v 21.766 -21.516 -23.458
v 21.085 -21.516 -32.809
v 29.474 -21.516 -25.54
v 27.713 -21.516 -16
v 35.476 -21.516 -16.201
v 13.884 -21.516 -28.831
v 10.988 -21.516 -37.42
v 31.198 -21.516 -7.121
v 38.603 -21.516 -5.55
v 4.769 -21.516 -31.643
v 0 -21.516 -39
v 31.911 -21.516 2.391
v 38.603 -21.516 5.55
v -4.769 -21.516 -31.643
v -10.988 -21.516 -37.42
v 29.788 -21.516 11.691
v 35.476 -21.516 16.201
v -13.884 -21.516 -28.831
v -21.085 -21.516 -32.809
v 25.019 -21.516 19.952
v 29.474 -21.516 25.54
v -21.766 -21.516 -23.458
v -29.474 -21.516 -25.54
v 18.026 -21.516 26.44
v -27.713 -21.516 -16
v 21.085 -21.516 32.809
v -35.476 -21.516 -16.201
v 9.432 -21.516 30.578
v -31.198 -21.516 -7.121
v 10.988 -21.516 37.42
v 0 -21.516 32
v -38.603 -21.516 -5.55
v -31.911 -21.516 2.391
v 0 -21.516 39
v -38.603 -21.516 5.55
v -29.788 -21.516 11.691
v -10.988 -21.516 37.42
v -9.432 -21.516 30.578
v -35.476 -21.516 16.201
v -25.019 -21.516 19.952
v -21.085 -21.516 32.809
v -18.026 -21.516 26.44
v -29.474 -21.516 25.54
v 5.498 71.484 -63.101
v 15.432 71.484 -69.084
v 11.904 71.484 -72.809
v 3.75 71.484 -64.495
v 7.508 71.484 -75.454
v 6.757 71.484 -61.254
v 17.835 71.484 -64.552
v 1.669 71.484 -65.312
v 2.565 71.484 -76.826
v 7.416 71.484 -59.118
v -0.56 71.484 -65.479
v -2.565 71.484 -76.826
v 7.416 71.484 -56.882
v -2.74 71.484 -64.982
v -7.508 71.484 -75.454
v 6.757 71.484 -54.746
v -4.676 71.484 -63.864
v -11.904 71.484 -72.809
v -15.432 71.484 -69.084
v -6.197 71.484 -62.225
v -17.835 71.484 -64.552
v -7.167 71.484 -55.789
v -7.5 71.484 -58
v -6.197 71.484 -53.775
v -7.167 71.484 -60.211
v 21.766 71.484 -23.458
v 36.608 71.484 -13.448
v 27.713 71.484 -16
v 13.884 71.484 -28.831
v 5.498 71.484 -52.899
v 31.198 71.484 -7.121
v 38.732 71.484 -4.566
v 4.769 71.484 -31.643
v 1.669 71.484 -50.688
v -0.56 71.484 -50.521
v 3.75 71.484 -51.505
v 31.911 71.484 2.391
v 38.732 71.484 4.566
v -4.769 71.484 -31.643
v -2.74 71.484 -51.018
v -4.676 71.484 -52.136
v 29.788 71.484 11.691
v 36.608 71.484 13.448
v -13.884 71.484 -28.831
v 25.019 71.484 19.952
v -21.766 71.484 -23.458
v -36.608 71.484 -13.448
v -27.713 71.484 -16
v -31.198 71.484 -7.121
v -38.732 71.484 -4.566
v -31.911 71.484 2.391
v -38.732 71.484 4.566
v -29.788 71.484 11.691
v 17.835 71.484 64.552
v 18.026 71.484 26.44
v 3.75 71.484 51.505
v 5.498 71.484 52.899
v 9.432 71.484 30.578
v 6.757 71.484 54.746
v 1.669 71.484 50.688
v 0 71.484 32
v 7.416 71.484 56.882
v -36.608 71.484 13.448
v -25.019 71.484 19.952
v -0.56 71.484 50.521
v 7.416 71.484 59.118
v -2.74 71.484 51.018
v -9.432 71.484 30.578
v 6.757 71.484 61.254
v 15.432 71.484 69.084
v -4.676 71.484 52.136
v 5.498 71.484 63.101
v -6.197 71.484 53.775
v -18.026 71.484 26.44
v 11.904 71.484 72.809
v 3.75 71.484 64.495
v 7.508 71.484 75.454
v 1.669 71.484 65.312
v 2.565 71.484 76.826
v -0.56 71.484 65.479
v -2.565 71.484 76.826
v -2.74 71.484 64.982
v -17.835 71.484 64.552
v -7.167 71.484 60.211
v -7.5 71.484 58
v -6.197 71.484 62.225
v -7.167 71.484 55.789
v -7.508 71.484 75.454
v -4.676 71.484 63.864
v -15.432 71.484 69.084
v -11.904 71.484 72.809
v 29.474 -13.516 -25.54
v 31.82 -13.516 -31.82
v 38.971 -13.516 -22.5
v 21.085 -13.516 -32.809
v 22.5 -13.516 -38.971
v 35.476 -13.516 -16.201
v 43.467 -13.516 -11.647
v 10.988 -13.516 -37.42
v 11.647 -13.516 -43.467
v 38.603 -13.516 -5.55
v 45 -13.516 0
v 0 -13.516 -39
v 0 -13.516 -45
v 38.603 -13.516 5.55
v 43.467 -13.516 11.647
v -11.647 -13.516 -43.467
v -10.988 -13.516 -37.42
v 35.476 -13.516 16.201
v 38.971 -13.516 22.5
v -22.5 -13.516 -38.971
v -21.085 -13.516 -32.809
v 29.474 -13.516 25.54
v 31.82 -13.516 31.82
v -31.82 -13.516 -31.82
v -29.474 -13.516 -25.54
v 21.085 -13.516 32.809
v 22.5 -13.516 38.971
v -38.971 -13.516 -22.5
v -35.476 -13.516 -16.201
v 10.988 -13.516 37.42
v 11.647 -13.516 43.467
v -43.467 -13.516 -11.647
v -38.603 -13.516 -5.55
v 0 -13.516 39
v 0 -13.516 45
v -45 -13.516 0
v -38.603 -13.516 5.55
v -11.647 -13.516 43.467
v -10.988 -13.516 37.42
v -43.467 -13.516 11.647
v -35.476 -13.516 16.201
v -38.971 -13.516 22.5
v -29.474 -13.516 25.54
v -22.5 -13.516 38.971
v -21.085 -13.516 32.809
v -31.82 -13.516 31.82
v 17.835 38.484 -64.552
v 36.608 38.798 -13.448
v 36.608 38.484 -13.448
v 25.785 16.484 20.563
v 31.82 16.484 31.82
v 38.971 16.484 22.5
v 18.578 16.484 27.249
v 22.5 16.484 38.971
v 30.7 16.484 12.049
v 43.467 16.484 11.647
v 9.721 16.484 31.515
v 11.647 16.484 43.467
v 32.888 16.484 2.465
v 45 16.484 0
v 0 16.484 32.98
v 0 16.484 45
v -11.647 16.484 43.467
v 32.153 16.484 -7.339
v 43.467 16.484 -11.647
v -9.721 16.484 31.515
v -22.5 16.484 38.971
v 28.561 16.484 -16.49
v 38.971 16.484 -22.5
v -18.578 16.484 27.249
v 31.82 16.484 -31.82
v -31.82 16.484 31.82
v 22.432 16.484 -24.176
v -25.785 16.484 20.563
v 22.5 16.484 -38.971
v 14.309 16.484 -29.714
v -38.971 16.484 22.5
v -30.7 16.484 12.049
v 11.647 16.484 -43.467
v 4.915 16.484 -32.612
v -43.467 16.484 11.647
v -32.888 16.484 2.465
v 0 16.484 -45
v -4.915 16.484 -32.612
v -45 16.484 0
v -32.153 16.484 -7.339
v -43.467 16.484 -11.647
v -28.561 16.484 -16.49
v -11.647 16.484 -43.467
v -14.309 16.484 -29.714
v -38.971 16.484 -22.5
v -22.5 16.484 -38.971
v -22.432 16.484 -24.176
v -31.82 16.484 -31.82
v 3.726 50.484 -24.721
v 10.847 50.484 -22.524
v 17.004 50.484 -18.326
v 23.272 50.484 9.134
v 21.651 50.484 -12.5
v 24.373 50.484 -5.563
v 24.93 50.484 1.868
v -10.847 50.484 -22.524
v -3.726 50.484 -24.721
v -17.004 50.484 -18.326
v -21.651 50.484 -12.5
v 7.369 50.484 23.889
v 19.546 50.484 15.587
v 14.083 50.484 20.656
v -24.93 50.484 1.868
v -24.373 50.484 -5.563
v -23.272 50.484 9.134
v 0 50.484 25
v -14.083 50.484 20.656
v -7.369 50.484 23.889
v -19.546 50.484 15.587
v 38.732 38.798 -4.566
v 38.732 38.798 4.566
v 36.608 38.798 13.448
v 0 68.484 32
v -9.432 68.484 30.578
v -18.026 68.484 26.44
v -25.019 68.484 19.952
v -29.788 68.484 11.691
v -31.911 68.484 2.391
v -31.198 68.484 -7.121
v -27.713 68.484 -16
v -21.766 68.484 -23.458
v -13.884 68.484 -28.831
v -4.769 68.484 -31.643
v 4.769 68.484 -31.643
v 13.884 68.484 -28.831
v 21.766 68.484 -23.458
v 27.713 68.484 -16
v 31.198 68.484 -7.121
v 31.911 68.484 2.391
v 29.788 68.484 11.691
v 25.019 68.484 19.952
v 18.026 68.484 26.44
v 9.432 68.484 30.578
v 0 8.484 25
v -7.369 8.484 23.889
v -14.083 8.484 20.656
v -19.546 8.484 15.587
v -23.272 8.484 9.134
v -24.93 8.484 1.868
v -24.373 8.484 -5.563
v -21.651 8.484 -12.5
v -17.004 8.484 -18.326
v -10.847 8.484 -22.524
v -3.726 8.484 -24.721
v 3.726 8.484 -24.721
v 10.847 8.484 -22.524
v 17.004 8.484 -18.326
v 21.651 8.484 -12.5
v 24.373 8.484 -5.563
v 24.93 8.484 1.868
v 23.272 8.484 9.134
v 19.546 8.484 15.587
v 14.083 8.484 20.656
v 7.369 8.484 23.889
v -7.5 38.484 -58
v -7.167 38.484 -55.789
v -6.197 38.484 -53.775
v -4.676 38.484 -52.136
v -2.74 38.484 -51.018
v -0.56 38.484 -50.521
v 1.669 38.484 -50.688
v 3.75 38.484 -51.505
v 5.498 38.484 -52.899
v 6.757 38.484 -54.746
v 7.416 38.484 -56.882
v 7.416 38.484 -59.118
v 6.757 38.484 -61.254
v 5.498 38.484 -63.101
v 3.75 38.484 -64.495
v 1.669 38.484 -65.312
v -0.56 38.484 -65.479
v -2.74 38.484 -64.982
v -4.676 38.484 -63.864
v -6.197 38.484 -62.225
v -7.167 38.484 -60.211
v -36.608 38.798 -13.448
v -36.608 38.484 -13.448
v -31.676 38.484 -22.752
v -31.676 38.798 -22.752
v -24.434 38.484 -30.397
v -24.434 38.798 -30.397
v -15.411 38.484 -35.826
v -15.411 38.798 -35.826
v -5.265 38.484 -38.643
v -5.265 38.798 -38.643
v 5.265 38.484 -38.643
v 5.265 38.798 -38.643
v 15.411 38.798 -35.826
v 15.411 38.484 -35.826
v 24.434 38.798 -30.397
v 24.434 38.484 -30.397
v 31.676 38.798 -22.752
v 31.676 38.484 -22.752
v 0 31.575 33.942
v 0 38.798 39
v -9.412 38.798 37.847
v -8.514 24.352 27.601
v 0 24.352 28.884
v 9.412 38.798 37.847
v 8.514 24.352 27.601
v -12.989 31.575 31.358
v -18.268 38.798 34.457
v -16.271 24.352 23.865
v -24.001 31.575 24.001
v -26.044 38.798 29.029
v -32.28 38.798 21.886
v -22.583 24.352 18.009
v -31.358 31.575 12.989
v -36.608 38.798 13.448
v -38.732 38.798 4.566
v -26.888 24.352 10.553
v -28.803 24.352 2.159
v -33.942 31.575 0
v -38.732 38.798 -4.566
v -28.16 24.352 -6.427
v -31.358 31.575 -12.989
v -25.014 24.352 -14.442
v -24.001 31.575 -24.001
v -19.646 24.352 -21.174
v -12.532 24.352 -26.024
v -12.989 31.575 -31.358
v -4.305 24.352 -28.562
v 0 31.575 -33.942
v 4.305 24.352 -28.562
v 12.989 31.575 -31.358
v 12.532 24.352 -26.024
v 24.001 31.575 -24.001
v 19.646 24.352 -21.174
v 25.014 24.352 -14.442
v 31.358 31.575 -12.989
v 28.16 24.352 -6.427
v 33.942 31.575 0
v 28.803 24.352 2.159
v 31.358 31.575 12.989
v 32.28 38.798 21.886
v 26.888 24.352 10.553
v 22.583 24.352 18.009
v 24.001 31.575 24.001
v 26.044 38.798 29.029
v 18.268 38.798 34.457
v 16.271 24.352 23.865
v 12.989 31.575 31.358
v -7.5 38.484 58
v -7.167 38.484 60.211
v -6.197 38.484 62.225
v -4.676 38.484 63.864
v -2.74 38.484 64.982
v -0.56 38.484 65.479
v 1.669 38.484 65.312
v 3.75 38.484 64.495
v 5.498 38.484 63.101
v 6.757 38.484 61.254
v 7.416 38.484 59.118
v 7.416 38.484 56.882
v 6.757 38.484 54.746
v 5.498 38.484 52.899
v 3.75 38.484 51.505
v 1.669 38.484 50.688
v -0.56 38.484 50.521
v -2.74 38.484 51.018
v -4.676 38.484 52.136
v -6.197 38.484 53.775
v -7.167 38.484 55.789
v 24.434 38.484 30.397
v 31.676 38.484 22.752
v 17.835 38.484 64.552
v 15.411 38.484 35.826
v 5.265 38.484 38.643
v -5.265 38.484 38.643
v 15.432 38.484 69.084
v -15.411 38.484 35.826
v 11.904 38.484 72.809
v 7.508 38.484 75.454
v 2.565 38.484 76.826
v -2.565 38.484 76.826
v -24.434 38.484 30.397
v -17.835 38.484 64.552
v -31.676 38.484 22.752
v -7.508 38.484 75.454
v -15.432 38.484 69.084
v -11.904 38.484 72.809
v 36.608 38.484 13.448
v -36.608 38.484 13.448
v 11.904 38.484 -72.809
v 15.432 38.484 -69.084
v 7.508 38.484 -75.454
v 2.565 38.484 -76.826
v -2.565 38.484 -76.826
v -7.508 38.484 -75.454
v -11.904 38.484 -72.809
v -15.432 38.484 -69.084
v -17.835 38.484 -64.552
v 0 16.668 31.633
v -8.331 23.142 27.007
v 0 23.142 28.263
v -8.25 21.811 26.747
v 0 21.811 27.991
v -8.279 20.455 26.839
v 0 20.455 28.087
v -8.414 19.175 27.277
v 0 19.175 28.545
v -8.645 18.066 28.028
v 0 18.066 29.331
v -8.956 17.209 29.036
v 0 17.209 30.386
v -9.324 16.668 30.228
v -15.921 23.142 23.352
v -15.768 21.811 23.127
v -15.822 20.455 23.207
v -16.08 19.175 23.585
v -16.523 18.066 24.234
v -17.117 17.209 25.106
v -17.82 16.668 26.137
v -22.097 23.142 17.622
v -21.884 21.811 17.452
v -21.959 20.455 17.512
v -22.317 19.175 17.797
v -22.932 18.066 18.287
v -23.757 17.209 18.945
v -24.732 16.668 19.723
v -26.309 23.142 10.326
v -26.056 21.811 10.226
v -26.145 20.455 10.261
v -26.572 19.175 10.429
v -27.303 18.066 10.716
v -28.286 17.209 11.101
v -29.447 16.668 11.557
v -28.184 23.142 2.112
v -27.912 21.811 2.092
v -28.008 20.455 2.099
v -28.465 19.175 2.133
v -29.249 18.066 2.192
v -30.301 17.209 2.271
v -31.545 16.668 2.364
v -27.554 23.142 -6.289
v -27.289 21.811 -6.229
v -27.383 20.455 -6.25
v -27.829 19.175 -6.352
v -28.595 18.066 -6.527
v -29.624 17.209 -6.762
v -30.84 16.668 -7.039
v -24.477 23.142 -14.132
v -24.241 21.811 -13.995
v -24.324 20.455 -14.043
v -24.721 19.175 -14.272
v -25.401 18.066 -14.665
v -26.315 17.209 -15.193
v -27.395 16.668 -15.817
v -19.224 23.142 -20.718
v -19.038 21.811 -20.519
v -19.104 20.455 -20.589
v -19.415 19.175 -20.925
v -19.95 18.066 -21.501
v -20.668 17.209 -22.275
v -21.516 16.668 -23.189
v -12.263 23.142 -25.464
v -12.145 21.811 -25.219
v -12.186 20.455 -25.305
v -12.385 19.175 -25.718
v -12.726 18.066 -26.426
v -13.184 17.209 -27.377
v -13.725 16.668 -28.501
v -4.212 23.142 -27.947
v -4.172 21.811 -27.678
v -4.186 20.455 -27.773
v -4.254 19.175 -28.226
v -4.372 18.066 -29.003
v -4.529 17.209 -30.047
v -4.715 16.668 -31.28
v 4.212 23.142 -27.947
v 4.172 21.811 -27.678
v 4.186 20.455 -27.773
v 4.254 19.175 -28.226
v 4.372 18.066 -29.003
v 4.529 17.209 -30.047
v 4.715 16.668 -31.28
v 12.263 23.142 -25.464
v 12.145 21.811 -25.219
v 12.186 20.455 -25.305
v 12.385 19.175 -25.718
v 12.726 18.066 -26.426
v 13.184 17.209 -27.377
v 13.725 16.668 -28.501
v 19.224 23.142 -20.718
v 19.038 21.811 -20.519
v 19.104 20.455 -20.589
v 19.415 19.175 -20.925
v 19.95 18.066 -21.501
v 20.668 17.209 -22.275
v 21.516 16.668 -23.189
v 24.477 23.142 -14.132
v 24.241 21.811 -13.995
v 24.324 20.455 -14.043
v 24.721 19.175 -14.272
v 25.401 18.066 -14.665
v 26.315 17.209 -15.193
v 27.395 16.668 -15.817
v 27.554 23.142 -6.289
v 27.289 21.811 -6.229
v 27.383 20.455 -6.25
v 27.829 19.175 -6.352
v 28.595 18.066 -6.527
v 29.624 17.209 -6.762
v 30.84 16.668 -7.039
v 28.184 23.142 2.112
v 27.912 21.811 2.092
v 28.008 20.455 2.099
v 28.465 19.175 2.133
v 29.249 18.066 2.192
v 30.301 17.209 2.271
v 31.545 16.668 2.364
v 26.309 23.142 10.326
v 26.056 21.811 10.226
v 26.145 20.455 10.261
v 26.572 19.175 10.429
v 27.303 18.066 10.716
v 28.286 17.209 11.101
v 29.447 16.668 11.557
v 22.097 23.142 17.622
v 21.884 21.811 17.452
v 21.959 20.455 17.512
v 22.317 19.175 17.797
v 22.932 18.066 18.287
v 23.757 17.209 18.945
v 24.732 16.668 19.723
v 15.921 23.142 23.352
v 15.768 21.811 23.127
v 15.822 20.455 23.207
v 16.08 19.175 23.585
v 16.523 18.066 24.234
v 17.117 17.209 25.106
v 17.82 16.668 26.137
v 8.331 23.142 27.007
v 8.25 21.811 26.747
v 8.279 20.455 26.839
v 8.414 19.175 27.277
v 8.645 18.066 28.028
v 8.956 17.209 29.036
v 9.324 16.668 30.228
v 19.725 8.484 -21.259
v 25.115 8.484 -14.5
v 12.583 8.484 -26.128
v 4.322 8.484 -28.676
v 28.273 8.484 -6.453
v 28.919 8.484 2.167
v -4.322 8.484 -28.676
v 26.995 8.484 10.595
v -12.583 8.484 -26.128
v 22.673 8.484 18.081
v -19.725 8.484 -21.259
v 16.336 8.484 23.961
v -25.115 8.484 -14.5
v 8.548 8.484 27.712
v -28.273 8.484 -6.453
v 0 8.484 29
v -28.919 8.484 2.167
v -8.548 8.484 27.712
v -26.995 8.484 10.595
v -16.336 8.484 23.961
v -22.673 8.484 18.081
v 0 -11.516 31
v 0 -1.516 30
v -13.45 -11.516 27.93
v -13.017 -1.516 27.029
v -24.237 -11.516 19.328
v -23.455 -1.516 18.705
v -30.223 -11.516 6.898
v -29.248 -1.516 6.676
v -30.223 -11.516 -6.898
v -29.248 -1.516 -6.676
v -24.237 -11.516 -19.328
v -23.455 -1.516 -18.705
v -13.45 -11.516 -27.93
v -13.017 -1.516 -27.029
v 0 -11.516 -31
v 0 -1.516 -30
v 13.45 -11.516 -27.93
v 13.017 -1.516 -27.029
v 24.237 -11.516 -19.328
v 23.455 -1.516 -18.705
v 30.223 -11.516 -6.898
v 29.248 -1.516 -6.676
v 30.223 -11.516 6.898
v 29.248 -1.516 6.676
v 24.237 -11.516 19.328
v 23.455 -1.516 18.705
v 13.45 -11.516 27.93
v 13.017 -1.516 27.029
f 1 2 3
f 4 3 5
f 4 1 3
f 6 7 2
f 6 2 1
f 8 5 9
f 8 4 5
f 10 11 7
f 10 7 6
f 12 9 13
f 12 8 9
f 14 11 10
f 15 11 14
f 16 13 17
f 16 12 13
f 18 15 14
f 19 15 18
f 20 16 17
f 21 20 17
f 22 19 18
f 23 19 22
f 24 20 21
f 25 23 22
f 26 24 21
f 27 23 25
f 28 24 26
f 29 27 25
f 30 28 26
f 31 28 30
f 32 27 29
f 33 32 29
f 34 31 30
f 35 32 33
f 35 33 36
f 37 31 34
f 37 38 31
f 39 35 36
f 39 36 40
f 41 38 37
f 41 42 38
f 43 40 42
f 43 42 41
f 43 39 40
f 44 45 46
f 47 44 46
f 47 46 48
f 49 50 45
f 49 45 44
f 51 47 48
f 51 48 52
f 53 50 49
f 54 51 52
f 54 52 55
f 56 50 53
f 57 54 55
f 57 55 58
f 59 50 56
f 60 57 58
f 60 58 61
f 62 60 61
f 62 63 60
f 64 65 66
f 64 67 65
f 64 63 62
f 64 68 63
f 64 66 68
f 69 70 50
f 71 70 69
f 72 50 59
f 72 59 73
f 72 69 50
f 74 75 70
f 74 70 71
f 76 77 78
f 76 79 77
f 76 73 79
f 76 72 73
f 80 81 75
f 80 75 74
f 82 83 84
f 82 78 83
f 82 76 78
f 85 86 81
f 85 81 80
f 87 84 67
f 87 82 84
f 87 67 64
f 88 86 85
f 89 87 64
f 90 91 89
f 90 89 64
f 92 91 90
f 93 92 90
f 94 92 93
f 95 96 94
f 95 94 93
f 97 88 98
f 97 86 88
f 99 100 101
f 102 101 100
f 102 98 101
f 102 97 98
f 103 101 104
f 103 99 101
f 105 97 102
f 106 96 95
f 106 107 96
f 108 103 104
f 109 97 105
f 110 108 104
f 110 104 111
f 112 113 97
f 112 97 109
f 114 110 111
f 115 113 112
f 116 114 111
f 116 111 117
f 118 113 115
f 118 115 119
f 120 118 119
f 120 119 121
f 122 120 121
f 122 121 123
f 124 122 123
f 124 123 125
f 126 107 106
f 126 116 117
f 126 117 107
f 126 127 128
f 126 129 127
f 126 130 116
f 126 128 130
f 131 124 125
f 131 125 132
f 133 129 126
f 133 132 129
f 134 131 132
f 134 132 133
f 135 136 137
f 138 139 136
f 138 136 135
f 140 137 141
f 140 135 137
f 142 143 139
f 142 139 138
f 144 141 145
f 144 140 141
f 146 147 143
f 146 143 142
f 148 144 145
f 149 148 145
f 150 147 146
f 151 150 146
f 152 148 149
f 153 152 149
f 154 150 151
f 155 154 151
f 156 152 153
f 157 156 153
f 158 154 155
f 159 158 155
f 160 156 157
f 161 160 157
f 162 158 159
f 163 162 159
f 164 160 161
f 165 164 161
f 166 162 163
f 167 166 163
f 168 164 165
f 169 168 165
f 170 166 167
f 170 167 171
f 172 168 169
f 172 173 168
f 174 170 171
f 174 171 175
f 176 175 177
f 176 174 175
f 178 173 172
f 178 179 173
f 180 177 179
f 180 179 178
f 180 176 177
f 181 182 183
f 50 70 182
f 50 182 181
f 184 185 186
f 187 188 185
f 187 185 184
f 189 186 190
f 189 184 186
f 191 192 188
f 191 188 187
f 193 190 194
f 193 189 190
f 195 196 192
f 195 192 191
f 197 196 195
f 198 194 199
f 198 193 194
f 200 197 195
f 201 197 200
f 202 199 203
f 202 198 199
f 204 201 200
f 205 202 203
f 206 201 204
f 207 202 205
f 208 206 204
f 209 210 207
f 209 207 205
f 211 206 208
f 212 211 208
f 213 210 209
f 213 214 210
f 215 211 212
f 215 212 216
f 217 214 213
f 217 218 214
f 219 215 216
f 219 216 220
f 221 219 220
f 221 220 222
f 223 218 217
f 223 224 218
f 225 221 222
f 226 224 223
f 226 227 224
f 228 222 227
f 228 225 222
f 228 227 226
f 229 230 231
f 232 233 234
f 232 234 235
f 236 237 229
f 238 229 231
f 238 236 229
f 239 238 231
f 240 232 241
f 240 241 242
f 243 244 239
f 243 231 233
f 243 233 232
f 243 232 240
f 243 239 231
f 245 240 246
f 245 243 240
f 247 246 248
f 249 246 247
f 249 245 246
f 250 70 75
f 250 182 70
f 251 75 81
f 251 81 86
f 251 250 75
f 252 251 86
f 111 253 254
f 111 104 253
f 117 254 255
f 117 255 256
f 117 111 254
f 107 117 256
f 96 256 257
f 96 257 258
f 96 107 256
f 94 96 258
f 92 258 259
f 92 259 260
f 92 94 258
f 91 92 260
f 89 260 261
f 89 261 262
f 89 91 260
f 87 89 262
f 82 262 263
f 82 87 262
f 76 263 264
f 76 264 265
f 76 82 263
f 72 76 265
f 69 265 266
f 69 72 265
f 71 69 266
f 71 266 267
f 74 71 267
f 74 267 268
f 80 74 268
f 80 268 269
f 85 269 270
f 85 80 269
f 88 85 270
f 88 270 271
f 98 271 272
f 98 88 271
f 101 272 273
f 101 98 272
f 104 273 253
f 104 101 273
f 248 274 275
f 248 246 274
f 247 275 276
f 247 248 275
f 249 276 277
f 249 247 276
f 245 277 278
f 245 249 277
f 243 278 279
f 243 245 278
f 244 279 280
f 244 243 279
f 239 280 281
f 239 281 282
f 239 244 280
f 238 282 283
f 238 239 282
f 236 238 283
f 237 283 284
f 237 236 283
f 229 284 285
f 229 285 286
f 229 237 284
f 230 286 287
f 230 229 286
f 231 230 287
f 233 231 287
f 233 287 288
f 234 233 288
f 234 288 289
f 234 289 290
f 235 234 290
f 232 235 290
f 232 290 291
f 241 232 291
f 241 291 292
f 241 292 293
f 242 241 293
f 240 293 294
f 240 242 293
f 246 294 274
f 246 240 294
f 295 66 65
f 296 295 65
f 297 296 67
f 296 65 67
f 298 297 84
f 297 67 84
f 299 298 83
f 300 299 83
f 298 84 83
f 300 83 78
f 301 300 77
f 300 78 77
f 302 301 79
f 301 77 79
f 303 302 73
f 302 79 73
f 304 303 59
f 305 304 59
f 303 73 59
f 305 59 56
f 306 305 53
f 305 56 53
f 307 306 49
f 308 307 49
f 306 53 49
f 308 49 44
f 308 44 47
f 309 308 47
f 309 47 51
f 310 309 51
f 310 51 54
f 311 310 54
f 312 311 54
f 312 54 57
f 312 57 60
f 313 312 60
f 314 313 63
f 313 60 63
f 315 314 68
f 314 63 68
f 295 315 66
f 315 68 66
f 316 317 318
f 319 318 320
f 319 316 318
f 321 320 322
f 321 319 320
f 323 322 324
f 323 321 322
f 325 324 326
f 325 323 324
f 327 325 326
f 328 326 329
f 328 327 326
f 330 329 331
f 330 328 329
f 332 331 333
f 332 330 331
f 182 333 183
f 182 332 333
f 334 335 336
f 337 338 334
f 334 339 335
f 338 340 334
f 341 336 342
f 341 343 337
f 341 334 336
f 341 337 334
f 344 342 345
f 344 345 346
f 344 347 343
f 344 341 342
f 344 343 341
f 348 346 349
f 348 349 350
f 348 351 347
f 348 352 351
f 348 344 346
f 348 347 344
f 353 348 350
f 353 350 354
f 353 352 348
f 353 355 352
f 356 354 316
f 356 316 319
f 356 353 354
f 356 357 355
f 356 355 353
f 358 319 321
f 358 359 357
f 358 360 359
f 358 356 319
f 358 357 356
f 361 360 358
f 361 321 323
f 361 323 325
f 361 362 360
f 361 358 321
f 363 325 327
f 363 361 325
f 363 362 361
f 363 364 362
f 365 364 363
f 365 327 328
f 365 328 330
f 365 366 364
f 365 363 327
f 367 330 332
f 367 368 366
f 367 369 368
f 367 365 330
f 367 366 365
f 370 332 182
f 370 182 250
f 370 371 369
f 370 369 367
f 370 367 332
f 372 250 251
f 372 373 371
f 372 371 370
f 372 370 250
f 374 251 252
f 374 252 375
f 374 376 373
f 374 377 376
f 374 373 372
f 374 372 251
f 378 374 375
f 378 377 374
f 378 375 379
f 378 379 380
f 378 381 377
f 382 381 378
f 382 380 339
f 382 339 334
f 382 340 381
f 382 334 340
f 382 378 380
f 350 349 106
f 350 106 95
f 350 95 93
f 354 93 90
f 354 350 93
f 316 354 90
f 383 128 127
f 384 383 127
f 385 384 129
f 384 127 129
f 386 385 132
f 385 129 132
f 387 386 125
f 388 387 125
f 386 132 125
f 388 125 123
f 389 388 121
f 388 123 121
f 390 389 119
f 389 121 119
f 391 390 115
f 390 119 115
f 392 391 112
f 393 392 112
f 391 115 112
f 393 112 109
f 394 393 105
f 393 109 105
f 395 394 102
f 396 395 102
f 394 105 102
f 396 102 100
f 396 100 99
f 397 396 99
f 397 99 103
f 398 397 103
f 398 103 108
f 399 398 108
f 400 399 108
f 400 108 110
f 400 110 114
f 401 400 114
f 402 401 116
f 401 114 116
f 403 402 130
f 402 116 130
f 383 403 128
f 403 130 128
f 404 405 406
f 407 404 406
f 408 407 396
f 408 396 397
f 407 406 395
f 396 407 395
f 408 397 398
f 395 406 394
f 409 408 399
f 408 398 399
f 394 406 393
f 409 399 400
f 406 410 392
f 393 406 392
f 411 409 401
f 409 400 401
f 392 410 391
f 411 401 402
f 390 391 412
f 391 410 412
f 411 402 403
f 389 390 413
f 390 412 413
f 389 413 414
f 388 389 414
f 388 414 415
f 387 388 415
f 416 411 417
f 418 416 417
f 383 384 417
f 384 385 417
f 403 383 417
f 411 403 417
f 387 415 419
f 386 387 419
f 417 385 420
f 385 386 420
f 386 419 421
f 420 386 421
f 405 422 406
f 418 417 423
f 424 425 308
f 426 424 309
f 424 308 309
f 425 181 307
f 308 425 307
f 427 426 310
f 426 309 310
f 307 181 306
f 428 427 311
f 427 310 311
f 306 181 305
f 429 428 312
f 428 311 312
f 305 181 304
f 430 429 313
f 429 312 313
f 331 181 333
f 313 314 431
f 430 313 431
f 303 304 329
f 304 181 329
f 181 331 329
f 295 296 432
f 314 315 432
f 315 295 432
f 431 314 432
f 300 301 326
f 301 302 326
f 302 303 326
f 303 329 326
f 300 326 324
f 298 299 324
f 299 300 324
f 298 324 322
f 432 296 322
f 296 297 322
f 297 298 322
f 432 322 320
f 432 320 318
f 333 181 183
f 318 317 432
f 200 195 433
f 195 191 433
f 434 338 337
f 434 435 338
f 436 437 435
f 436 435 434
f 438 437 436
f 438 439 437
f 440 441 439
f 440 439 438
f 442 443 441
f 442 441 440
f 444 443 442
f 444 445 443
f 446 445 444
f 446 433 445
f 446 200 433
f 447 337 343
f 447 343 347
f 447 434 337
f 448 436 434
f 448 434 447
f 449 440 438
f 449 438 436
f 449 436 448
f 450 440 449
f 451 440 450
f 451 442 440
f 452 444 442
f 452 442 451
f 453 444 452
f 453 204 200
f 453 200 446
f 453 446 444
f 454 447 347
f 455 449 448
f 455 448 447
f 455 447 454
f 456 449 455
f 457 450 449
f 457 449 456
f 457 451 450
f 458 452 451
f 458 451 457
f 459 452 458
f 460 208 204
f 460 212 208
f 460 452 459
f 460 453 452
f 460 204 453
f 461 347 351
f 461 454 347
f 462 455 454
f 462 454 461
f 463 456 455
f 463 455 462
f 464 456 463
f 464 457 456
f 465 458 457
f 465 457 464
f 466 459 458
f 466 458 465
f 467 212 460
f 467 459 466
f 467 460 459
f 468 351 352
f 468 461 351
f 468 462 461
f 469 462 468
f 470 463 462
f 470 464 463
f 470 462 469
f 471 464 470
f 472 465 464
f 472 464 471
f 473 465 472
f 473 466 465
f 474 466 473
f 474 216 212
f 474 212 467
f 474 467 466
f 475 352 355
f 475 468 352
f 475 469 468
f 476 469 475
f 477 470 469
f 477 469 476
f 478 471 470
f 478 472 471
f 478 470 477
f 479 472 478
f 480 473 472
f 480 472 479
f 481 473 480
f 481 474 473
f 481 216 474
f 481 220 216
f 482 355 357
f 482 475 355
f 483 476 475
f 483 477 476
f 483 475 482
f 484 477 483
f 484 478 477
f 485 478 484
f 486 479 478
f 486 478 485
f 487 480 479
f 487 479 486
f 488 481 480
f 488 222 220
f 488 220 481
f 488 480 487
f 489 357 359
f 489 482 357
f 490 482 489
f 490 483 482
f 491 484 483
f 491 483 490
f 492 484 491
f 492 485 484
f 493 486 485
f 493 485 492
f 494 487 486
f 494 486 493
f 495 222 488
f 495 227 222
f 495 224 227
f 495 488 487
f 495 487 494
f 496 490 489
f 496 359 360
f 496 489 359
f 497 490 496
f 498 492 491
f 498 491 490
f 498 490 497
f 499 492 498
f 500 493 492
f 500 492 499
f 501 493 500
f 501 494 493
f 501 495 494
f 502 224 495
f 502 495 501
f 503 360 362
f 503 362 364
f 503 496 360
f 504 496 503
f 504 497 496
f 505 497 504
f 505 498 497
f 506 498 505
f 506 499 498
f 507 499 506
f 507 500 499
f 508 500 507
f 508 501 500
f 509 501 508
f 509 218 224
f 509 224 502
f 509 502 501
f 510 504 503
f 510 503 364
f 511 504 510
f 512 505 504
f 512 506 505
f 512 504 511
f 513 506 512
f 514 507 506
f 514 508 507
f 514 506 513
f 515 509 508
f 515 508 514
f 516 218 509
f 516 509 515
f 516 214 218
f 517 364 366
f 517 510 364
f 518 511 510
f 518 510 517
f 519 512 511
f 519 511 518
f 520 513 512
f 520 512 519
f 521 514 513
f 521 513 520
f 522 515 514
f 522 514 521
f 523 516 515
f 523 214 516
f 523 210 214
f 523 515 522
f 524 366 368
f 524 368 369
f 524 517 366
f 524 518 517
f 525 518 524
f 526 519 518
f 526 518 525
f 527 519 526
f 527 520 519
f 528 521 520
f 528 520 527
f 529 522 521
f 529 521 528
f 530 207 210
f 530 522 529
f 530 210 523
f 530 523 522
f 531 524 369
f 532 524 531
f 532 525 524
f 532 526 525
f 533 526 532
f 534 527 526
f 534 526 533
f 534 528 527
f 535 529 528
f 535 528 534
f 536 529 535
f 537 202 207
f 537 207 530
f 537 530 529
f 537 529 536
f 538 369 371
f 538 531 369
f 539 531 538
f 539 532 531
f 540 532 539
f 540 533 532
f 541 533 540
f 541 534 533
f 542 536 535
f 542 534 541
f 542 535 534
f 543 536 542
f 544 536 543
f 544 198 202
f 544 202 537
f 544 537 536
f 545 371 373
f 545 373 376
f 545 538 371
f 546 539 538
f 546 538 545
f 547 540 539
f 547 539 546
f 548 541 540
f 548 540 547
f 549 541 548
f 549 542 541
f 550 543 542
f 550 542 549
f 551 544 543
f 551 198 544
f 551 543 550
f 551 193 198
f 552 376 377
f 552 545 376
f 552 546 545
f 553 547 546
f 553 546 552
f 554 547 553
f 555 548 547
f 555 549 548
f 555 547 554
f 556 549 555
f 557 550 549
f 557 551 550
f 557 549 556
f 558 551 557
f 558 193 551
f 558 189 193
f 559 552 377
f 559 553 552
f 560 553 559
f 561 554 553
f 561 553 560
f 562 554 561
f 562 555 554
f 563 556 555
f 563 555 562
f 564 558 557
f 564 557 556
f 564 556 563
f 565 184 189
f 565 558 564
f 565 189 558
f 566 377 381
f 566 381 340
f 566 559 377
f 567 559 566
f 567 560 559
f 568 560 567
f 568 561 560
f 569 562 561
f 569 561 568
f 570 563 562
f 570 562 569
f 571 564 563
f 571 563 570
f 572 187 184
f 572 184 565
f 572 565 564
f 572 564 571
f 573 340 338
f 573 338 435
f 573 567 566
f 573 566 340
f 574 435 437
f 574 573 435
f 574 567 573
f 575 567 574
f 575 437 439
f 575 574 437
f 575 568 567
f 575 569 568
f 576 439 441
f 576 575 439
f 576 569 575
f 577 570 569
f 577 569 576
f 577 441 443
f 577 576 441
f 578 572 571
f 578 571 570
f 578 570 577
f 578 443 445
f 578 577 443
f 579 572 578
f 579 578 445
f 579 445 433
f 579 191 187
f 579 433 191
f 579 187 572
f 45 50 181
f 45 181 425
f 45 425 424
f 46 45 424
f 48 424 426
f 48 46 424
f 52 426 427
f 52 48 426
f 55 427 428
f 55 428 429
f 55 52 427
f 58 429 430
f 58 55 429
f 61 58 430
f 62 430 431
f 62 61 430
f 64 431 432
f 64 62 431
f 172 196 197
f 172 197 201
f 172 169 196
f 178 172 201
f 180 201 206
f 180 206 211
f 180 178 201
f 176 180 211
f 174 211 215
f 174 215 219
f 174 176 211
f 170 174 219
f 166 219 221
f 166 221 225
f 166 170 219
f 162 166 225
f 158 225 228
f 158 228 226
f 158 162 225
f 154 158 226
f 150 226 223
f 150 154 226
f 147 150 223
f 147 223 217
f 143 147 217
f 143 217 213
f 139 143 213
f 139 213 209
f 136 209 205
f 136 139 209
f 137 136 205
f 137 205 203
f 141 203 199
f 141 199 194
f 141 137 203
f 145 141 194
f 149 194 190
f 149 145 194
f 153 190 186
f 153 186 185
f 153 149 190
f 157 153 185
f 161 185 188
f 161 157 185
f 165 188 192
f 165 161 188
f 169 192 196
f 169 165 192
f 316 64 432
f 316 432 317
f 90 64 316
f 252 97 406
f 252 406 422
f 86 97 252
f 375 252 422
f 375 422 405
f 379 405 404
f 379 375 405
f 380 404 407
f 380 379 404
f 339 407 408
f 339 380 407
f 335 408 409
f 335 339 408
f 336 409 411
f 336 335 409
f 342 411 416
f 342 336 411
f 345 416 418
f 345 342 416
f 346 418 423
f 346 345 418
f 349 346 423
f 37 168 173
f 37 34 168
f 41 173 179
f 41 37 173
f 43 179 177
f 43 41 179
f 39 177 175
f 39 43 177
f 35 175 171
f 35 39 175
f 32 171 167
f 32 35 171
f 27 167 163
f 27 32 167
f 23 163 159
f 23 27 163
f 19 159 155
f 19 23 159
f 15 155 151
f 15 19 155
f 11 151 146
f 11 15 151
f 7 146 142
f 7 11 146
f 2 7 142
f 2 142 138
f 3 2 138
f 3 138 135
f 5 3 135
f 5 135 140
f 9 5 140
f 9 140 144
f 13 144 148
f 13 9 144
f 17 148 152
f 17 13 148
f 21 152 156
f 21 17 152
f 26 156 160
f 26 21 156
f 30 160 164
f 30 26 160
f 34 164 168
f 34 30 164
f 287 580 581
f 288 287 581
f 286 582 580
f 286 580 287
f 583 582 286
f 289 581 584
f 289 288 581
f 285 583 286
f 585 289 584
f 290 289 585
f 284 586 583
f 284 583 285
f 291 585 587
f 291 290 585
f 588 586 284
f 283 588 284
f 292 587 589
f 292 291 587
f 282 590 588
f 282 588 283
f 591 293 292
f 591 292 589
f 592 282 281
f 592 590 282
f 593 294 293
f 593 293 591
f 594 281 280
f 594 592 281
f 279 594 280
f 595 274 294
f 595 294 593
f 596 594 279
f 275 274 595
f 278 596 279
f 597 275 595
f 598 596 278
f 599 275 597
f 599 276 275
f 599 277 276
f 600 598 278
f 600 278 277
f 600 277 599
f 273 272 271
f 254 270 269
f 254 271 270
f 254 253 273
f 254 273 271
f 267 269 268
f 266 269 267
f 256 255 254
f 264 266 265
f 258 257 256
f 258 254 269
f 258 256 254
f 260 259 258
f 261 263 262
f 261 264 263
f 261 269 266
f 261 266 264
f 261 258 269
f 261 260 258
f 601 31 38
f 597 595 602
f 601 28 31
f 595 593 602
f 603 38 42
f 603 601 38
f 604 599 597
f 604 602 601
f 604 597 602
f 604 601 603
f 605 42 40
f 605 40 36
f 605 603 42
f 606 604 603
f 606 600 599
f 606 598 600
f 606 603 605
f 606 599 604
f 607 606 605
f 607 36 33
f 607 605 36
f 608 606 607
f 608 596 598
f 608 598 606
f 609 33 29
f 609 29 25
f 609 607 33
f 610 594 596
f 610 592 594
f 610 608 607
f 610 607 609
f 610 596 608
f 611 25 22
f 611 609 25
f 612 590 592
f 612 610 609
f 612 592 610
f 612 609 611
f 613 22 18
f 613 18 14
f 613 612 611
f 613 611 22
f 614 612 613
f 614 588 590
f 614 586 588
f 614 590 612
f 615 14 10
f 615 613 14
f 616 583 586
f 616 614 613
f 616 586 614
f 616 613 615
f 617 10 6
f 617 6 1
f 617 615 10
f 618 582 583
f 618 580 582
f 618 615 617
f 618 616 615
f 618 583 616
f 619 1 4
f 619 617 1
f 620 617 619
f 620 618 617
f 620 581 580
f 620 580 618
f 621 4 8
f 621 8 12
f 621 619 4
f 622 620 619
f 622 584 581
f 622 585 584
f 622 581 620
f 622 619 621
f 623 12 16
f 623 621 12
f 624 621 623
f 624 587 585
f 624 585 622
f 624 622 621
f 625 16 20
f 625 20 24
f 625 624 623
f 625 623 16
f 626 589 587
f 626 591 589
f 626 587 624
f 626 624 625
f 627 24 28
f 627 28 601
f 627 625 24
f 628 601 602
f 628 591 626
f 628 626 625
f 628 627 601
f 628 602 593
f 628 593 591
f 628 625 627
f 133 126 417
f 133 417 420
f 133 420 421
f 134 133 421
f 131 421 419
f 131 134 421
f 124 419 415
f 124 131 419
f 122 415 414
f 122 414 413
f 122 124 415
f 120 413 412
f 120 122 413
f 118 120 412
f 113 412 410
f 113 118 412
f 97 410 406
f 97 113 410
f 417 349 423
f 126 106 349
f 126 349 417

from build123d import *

# Parameters (mm, degrees)
F2_R     = 7.5
F4_DEPTH = 33


# Not quite as in the source:
# - a feature of the source that left no trace in its solid (it failed there, or was rolled back) is left out


with BuildPart() as f1:
    # F0 (on Right) → F1 (revolve)
    with BuildSketch(Plane.YZ):
        with BuildLine():
            Line((-13.5163067589, 39), (-21.5163067589, 39))
            Line((-21.5163067589, 39), (-21.5163067589, 32))
            Line((-21.5163067589, 32), (8.4836932411, 29))
            Line((8.4836932411, 29), (8.4836932411, 25))
            Line((8.4836932411, 25), (50.4836932411, 25))
            Line((50.4836932411, 25), (50.4836932411, 0))
            Line((50.4836932411, 0), (68.4836932411, 0))
            Line((68.4836932411, 0), (68.4836932411, 32))
            Line((68.4836932411, 32), (71.4836932411, 32))
            Line((71.4836932411, 32), (71.4836932411, 39))
            Line((71.4836932411, 39), (38.7984625995, 39))
            Line((38.7984625995, 39), (24.3515754229, 28.8841806952))
            ThreePointArc((24.3515754229, 28.8841806952), (19.1749501749, 28.5448867508), (16.4836932411, 32.9799409167))
            Line((16.4836932411, 32.9799409167), (16.4836932411, 45))
            Line((16.4836932411, 45), (-13.5163067589, 45))
            Line((-13.5163067589, 45), (-13.5163067589, 39))
        make_face()
    revolve(axis=Axis((0, 59.4836932411, 0), (0, -1, 0)))

    # F2 (on face) → F4 (join)
    with BuildSketch(Plane(origin=(0, 71.4836932411, 0), x_dir=(-1, 0, 0), z_dir=(0, 1, 0))):
        with BuildLine():
            ThreePointArc((36.6079755837, -13.4482758621), (0, -39), (-36.6079755837, -13.4482758621))
            Line((-36.6079755837, -13.4482758621), (-17.8346547716, -64.5517241379))
            ThreePointArc((-17.8346547716, -64.5517241379), (0, -77), (17.8346547716, -64.5517241379))
            Line((17.8346547716, -64.5517241379), (36.6079755837, -13.4482758621))
        make_face()
        with Locations((0, -58)):
            Circle(F2_R, mode=Mode.SUBTRACT)
        with BuildLine():
            ThreePointArc((17.8346547716, 64.5517241379), (0, 77), (-17.8346547716, 64.5517241379))
            Line((-17.8346547716, 64.5517241379), (-36.6079755837, 13.4482758621))
            ThreePointArc((-36.6079755837, 13.4482758621), (0, 39), (36.6079755837, 13.4482758621))
            Line((36.6079755837, 13.4482758621), (17.8346547716, 64.5517241379))
        make_face()
        with Locations((0, 58)):
            Circle(F2_R, mode=Mode.SUBTRACT)
    extrude(amount=-F4_DEPTH)


solid = f1.part
